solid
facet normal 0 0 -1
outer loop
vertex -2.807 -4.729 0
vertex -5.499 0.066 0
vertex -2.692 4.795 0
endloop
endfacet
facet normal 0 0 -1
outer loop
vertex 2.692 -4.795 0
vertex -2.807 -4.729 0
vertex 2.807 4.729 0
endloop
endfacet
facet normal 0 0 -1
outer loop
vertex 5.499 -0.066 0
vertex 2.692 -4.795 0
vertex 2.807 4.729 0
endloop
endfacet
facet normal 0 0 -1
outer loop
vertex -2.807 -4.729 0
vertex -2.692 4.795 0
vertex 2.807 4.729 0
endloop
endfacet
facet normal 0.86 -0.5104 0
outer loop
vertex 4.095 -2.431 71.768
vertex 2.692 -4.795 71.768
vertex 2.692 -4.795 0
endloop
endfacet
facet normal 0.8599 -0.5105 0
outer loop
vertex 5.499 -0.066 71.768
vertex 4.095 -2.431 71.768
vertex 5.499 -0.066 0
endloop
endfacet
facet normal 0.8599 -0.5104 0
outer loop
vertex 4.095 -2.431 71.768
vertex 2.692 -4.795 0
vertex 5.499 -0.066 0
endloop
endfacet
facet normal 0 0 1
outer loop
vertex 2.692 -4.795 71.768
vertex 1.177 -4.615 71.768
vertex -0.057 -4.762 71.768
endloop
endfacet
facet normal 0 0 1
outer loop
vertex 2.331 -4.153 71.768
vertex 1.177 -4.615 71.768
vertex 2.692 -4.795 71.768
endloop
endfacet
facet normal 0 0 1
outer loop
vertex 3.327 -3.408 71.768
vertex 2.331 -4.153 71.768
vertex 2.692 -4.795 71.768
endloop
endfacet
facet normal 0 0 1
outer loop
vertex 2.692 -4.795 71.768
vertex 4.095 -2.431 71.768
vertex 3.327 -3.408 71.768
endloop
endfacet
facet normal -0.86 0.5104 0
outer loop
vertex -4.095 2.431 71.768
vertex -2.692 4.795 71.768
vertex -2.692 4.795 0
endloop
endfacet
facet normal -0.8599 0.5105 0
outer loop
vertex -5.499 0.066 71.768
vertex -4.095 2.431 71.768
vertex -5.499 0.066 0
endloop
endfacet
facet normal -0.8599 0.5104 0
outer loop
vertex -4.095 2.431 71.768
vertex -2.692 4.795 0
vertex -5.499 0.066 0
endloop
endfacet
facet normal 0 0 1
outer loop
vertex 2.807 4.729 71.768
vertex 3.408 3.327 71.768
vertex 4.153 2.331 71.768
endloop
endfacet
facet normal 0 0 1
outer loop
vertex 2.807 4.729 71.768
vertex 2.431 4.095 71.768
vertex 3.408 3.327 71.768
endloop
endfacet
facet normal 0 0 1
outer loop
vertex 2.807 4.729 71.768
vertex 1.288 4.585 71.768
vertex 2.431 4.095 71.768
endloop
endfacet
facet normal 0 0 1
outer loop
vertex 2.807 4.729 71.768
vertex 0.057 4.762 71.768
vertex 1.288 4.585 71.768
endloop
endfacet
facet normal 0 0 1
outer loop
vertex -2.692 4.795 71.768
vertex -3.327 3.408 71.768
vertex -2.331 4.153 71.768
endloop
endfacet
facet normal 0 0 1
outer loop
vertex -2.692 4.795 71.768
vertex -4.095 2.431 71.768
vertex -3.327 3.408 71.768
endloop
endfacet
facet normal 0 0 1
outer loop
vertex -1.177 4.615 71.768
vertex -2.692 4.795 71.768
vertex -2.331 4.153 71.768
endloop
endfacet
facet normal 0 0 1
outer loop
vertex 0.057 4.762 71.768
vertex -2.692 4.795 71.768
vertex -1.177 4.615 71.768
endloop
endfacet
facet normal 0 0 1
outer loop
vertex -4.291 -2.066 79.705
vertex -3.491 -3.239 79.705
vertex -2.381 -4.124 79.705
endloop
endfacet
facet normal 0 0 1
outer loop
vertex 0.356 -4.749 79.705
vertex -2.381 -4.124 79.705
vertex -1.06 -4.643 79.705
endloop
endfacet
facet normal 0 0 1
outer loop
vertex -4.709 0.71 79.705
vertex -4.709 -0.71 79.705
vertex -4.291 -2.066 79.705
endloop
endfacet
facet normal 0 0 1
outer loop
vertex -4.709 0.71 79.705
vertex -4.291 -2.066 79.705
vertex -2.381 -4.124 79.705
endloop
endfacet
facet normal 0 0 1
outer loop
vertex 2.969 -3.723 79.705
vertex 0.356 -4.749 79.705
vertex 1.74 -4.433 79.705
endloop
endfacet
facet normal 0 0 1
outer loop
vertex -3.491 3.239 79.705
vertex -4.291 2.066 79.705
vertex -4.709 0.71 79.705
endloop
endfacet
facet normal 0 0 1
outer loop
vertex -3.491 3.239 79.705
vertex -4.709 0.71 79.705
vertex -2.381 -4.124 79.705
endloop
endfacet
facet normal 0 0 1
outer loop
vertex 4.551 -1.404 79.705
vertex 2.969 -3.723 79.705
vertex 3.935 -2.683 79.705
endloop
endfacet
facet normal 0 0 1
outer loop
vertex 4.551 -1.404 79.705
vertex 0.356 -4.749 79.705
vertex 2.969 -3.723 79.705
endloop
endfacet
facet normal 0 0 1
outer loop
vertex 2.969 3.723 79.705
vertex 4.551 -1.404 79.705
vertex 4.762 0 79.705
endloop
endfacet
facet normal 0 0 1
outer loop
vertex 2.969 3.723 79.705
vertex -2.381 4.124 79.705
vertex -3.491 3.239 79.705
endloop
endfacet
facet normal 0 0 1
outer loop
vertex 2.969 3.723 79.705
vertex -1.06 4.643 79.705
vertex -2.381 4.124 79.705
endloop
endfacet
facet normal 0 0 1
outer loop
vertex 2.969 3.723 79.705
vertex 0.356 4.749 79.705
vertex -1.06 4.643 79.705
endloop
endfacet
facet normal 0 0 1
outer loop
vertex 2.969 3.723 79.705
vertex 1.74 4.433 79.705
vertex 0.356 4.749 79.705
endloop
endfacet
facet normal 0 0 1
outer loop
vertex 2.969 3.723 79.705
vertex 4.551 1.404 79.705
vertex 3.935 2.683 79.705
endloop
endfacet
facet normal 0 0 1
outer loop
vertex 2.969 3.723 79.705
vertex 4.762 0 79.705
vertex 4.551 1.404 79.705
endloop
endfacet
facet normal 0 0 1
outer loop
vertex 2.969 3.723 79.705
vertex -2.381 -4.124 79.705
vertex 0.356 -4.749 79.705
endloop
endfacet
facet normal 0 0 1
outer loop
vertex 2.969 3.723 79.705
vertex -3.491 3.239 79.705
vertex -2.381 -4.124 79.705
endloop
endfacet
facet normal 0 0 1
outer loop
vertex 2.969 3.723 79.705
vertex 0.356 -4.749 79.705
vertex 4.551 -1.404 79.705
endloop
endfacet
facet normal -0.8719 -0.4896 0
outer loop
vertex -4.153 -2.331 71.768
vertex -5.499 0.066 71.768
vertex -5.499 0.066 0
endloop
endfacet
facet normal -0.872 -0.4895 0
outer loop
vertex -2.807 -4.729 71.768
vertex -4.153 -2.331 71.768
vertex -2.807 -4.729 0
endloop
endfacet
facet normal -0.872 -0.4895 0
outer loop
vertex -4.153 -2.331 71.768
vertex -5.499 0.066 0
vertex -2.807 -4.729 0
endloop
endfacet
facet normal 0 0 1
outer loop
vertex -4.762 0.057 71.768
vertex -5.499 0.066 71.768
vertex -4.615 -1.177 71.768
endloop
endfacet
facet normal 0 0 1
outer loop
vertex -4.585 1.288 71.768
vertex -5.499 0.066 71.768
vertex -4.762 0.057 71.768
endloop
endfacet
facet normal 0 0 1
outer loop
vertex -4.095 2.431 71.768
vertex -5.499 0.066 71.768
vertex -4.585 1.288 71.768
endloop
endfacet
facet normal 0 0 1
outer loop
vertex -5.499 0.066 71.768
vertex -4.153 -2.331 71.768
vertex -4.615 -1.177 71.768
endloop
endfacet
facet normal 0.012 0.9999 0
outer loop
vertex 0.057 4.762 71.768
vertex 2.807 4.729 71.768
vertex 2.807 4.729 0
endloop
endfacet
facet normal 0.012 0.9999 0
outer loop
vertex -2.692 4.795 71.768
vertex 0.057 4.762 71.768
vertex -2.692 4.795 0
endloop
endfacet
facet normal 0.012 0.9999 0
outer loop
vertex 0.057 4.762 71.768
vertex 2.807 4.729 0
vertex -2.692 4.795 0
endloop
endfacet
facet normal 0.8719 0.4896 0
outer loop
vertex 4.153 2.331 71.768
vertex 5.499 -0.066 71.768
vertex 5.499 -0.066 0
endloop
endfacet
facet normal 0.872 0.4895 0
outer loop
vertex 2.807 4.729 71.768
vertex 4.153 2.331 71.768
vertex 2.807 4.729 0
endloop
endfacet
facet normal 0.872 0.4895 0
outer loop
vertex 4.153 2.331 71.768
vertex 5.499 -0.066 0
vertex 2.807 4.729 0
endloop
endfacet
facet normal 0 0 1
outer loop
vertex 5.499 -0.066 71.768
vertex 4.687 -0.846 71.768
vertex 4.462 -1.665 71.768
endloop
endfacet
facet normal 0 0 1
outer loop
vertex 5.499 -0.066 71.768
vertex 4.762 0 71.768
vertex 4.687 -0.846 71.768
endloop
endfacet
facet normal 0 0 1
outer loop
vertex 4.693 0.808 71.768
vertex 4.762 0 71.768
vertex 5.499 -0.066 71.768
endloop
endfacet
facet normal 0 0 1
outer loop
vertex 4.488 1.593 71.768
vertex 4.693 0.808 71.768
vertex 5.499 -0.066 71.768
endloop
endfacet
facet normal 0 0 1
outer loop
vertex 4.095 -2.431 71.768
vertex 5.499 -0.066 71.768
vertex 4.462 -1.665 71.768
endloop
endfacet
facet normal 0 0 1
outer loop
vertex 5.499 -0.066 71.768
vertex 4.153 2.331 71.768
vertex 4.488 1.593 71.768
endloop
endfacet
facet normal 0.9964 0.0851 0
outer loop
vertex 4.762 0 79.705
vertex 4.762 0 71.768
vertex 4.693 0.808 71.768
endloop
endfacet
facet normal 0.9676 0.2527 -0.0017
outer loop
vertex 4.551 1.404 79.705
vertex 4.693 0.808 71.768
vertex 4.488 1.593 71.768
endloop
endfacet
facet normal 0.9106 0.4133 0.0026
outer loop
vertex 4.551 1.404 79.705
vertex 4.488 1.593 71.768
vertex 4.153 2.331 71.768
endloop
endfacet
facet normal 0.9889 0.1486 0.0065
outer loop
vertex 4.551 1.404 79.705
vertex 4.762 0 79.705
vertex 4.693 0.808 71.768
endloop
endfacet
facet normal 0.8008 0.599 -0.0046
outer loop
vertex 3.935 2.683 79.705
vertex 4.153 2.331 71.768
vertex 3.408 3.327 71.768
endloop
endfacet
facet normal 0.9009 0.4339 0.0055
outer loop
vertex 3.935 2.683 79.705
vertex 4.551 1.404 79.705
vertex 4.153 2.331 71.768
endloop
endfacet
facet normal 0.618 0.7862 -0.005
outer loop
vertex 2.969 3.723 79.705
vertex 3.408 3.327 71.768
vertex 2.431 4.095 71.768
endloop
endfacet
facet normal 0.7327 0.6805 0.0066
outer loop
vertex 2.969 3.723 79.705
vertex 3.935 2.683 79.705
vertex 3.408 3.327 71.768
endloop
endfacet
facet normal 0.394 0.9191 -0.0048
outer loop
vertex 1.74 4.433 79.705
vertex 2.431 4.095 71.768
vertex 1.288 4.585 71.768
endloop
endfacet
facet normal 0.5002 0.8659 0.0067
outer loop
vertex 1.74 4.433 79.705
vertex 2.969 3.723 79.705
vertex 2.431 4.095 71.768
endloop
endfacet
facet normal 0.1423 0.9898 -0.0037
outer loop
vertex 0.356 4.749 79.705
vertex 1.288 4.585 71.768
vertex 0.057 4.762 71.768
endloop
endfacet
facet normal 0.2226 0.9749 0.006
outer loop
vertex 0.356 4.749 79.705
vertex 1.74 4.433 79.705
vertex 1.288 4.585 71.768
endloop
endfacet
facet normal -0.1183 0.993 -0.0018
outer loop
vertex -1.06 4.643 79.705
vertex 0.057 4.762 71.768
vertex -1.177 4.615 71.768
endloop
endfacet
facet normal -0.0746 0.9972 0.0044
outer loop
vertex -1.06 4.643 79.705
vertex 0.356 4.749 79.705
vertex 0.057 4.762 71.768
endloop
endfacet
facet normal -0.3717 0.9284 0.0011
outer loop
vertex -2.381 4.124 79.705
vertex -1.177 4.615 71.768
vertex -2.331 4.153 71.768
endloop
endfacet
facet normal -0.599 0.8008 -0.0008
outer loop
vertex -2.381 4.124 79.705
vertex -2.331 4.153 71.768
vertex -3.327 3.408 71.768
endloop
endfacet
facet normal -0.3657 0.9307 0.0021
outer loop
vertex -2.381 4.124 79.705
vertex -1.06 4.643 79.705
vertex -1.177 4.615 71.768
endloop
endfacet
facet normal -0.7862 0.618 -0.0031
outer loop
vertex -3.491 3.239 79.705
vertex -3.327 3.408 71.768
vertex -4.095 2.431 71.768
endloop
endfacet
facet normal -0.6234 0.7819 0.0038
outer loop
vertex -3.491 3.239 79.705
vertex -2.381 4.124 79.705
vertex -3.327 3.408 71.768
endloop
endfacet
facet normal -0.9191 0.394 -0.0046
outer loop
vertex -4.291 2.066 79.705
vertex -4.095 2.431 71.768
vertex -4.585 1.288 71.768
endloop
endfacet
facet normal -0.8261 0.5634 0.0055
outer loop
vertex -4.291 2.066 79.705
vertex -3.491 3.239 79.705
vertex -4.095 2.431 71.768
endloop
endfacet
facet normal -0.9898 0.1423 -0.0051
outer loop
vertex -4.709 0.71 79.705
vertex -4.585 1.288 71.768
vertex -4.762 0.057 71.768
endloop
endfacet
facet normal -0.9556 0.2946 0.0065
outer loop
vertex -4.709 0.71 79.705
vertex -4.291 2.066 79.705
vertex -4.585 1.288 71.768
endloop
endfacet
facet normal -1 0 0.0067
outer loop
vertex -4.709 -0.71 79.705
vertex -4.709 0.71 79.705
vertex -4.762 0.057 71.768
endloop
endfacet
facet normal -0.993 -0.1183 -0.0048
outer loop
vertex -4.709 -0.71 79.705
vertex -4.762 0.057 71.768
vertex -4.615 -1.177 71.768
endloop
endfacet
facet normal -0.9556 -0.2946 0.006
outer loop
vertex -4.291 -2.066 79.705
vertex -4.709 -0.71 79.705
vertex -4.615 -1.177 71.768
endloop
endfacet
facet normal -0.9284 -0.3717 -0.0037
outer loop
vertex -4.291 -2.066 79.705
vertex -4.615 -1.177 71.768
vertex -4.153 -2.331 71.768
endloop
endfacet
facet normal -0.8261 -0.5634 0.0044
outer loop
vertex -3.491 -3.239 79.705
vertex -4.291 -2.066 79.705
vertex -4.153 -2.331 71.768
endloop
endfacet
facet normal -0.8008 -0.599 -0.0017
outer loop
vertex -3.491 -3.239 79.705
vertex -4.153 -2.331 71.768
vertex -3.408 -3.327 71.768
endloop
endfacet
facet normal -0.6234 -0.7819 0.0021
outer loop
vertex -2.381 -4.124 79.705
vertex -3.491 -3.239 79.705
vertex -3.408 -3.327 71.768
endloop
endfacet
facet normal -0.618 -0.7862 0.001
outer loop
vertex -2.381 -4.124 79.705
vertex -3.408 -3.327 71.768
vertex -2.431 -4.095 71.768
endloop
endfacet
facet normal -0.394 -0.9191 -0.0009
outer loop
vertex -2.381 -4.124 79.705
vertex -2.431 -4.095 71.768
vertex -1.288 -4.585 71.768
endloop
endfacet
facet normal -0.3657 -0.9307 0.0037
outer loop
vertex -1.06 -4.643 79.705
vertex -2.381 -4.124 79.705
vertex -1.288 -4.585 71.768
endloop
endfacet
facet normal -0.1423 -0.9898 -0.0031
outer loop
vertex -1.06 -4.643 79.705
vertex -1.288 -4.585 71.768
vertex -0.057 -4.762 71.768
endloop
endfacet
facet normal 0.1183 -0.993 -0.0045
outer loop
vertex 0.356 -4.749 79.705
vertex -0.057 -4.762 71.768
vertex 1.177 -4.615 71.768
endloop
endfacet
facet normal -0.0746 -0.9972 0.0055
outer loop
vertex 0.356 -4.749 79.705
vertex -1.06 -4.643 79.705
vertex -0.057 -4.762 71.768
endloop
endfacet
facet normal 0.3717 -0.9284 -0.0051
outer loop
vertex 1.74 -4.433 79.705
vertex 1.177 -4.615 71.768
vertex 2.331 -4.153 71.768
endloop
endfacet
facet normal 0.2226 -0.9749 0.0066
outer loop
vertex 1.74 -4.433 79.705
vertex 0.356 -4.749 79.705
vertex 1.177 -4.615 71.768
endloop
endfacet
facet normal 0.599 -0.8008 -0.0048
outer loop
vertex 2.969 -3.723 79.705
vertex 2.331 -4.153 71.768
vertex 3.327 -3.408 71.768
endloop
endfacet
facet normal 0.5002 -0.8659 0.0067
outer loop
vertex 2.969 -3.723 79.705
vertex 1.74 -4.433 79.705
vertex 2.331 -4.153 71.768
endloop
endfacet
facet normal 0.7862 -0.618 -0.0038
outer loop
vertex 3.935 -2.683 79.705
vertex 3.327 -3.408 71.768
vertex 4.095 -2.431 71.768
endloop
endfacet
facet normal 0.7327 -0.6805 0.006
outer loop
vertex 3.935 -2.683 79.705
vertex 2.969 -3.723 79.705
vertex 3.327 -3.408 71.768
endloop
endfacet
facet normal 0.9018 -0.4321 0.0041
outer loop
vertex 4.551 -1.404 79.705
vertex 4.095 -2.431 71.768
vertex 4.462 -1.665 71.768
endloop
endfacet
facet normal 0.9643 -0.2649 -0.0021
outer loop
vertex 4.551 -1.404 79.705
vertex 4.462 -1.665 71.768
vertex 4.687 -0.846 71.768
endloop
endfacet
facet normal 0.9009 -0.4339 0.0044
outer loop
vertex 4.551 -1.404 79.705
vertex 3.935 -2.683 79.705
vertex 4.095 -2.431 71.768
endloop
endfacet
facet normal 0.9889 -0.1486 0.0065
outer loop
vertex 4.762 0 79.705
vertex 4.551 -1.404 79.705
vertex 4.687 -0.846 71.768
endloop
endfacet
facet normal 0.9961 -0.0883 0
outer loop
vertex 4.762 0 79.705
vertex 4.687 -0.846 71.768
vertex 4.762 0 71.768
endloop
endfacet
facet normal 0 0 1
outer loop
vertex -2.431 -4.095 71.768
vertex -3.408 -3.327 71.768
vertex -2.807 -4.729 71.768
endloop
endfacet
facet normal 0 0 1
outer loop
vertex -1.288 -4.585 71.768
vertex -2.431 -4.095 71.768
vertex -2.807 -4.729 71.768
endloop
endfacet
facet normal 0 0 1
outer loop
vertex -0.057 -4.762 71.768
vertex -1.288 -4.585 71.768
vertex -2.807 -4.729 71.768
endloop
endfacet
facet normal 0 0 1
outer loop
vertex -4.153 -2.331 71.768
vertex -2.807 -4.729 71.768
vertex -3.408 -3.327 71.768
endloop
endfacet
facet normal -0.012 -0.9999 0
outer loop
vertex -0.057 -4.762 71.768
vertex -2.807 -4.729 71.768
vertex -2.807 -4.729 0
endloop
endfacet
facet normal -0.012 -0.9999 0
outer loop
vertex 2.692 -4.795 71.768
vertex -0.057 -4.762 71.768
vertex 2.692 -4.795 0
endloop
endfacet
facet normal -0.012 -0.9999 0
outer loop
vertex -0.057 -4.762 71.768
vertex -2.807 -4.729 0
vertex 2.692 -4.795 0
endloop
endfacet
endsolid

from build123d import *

# Parameters (mm, degrees)
BOSS_EXTRUDE1_DEPTH = 79.7052
SKETCH5_R           = 5.499261314
SKETCH5_R_2         = 4.7625
CUT_EXTRUDE2_DEPTH  = 7.9375


with BuildPart() as part:
    # Sketch1 → Boss-Extrude1 (new body)
    with BuildSketch(Plane.XY):
        Polygon((2.806881074, 4.728984419), (-2.691980104, 4.795322525), (-5.498861178, 0.066338106), (-2.806881074, -4.728984419), (2.691980104, -4.795322525), (5.498861178, -0.066338106), align=None)
    extrude(amount=BOSS_EXTRUDE1_DEPTH)

    # Sketch5 → Cut-Extrude2 (cut)
    with BuildSketch(Plane.XY.offset(79.7052)):
        Circle(SKETCH5_R)
        Circle(SKETCH5_R_2, mode=Mode.SUBTRACT)
    extrude(amount=-CUT_EXTRUDE2_DEPTH, mode=Mode.SUBTRACT)


solid = part.part
